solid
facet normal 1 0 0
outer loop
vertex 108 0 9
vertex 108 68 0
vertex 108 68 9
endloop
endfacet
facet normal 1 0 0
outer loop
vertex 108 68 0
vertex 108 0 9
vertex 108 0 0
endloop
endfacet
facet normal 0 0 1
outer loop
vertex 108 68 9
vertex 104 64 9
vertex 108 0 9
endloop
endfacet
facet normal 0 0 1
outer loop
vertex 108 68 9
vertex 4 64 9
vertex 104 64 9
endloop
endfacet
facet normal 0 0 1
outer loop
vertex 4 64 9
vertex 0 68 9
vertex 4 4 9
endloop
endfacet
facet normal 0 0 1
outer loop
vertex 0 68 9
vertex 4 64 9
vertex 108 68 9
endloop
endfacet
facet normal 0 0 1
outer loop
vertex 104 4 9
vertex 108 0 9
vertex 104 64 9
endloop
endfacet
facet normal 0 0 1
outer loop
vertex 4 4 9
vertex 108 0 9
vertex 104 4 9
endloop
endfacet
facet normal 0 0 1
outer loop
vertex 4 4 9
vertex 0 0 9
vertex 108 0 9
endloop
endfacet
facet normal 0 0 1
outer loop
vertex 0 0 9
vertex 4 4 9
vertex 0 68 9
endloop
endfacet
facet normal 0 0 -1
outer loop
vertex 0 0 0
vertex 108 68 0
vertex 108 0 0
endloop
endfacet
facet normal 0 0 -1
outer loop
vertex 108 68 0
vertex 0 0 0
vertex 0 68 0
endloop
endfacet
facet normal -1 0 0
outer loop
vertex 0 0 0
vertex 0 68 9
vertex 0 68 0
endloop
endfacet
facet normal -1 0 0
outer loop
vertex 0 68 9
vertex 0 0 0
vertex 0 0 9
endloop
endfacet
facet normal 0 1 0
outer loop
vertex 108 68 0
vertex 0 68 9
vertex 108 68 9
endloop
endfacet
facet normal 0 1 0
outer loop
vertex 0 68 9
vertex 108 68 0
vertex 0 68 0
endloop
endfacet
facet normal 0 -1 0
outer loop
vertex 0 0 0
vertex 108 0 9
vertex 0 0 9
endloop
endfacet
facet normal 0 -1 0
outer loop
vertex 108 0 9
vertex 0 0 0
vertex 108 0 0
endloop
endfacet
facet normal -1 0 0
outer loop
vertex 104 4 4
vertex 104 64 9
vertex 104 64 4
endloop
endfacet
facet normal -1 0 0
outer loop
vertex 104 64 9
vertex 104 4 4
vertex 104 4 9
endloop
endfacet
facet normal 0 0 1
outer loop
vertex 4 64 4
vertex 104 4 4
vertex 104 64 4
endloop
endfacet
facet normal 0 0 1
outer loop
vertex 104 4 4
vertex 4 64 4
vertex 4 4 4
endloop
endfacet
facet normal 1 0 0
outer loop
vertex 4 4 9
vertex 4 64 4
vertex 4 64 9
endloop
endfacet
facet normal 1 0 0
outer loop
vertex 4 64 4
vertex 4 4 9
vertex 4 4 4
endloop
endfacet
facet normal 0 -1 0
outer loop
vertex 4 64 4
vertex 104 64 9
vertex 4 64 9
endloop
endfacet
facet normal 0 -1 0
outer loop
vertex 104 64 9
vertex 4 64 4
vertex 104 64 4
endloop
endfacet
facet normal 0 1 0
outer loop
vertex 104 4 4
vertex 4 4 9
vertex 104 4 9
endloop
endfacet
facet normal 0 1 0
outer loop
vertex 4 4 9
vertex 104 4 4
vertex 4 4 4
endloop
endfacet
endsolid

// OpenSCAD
// Size of one pentomino unit square (in mm)
length=10;

// Number of rows
tray_rows=6;

// Number of columns
tray_cols=10;

// Thickness of walls and floor (in mm)
wall=4;


module tray() {
	difference() {
		cube([tray_cols*length + 2*wall, tray_rows*length + 2*wall, length/2+wall]);
		translate([wall, wall, wall])
			cube([tray_cols*length, tray_rows*length, length/2+1]);
	}
}

tray();
